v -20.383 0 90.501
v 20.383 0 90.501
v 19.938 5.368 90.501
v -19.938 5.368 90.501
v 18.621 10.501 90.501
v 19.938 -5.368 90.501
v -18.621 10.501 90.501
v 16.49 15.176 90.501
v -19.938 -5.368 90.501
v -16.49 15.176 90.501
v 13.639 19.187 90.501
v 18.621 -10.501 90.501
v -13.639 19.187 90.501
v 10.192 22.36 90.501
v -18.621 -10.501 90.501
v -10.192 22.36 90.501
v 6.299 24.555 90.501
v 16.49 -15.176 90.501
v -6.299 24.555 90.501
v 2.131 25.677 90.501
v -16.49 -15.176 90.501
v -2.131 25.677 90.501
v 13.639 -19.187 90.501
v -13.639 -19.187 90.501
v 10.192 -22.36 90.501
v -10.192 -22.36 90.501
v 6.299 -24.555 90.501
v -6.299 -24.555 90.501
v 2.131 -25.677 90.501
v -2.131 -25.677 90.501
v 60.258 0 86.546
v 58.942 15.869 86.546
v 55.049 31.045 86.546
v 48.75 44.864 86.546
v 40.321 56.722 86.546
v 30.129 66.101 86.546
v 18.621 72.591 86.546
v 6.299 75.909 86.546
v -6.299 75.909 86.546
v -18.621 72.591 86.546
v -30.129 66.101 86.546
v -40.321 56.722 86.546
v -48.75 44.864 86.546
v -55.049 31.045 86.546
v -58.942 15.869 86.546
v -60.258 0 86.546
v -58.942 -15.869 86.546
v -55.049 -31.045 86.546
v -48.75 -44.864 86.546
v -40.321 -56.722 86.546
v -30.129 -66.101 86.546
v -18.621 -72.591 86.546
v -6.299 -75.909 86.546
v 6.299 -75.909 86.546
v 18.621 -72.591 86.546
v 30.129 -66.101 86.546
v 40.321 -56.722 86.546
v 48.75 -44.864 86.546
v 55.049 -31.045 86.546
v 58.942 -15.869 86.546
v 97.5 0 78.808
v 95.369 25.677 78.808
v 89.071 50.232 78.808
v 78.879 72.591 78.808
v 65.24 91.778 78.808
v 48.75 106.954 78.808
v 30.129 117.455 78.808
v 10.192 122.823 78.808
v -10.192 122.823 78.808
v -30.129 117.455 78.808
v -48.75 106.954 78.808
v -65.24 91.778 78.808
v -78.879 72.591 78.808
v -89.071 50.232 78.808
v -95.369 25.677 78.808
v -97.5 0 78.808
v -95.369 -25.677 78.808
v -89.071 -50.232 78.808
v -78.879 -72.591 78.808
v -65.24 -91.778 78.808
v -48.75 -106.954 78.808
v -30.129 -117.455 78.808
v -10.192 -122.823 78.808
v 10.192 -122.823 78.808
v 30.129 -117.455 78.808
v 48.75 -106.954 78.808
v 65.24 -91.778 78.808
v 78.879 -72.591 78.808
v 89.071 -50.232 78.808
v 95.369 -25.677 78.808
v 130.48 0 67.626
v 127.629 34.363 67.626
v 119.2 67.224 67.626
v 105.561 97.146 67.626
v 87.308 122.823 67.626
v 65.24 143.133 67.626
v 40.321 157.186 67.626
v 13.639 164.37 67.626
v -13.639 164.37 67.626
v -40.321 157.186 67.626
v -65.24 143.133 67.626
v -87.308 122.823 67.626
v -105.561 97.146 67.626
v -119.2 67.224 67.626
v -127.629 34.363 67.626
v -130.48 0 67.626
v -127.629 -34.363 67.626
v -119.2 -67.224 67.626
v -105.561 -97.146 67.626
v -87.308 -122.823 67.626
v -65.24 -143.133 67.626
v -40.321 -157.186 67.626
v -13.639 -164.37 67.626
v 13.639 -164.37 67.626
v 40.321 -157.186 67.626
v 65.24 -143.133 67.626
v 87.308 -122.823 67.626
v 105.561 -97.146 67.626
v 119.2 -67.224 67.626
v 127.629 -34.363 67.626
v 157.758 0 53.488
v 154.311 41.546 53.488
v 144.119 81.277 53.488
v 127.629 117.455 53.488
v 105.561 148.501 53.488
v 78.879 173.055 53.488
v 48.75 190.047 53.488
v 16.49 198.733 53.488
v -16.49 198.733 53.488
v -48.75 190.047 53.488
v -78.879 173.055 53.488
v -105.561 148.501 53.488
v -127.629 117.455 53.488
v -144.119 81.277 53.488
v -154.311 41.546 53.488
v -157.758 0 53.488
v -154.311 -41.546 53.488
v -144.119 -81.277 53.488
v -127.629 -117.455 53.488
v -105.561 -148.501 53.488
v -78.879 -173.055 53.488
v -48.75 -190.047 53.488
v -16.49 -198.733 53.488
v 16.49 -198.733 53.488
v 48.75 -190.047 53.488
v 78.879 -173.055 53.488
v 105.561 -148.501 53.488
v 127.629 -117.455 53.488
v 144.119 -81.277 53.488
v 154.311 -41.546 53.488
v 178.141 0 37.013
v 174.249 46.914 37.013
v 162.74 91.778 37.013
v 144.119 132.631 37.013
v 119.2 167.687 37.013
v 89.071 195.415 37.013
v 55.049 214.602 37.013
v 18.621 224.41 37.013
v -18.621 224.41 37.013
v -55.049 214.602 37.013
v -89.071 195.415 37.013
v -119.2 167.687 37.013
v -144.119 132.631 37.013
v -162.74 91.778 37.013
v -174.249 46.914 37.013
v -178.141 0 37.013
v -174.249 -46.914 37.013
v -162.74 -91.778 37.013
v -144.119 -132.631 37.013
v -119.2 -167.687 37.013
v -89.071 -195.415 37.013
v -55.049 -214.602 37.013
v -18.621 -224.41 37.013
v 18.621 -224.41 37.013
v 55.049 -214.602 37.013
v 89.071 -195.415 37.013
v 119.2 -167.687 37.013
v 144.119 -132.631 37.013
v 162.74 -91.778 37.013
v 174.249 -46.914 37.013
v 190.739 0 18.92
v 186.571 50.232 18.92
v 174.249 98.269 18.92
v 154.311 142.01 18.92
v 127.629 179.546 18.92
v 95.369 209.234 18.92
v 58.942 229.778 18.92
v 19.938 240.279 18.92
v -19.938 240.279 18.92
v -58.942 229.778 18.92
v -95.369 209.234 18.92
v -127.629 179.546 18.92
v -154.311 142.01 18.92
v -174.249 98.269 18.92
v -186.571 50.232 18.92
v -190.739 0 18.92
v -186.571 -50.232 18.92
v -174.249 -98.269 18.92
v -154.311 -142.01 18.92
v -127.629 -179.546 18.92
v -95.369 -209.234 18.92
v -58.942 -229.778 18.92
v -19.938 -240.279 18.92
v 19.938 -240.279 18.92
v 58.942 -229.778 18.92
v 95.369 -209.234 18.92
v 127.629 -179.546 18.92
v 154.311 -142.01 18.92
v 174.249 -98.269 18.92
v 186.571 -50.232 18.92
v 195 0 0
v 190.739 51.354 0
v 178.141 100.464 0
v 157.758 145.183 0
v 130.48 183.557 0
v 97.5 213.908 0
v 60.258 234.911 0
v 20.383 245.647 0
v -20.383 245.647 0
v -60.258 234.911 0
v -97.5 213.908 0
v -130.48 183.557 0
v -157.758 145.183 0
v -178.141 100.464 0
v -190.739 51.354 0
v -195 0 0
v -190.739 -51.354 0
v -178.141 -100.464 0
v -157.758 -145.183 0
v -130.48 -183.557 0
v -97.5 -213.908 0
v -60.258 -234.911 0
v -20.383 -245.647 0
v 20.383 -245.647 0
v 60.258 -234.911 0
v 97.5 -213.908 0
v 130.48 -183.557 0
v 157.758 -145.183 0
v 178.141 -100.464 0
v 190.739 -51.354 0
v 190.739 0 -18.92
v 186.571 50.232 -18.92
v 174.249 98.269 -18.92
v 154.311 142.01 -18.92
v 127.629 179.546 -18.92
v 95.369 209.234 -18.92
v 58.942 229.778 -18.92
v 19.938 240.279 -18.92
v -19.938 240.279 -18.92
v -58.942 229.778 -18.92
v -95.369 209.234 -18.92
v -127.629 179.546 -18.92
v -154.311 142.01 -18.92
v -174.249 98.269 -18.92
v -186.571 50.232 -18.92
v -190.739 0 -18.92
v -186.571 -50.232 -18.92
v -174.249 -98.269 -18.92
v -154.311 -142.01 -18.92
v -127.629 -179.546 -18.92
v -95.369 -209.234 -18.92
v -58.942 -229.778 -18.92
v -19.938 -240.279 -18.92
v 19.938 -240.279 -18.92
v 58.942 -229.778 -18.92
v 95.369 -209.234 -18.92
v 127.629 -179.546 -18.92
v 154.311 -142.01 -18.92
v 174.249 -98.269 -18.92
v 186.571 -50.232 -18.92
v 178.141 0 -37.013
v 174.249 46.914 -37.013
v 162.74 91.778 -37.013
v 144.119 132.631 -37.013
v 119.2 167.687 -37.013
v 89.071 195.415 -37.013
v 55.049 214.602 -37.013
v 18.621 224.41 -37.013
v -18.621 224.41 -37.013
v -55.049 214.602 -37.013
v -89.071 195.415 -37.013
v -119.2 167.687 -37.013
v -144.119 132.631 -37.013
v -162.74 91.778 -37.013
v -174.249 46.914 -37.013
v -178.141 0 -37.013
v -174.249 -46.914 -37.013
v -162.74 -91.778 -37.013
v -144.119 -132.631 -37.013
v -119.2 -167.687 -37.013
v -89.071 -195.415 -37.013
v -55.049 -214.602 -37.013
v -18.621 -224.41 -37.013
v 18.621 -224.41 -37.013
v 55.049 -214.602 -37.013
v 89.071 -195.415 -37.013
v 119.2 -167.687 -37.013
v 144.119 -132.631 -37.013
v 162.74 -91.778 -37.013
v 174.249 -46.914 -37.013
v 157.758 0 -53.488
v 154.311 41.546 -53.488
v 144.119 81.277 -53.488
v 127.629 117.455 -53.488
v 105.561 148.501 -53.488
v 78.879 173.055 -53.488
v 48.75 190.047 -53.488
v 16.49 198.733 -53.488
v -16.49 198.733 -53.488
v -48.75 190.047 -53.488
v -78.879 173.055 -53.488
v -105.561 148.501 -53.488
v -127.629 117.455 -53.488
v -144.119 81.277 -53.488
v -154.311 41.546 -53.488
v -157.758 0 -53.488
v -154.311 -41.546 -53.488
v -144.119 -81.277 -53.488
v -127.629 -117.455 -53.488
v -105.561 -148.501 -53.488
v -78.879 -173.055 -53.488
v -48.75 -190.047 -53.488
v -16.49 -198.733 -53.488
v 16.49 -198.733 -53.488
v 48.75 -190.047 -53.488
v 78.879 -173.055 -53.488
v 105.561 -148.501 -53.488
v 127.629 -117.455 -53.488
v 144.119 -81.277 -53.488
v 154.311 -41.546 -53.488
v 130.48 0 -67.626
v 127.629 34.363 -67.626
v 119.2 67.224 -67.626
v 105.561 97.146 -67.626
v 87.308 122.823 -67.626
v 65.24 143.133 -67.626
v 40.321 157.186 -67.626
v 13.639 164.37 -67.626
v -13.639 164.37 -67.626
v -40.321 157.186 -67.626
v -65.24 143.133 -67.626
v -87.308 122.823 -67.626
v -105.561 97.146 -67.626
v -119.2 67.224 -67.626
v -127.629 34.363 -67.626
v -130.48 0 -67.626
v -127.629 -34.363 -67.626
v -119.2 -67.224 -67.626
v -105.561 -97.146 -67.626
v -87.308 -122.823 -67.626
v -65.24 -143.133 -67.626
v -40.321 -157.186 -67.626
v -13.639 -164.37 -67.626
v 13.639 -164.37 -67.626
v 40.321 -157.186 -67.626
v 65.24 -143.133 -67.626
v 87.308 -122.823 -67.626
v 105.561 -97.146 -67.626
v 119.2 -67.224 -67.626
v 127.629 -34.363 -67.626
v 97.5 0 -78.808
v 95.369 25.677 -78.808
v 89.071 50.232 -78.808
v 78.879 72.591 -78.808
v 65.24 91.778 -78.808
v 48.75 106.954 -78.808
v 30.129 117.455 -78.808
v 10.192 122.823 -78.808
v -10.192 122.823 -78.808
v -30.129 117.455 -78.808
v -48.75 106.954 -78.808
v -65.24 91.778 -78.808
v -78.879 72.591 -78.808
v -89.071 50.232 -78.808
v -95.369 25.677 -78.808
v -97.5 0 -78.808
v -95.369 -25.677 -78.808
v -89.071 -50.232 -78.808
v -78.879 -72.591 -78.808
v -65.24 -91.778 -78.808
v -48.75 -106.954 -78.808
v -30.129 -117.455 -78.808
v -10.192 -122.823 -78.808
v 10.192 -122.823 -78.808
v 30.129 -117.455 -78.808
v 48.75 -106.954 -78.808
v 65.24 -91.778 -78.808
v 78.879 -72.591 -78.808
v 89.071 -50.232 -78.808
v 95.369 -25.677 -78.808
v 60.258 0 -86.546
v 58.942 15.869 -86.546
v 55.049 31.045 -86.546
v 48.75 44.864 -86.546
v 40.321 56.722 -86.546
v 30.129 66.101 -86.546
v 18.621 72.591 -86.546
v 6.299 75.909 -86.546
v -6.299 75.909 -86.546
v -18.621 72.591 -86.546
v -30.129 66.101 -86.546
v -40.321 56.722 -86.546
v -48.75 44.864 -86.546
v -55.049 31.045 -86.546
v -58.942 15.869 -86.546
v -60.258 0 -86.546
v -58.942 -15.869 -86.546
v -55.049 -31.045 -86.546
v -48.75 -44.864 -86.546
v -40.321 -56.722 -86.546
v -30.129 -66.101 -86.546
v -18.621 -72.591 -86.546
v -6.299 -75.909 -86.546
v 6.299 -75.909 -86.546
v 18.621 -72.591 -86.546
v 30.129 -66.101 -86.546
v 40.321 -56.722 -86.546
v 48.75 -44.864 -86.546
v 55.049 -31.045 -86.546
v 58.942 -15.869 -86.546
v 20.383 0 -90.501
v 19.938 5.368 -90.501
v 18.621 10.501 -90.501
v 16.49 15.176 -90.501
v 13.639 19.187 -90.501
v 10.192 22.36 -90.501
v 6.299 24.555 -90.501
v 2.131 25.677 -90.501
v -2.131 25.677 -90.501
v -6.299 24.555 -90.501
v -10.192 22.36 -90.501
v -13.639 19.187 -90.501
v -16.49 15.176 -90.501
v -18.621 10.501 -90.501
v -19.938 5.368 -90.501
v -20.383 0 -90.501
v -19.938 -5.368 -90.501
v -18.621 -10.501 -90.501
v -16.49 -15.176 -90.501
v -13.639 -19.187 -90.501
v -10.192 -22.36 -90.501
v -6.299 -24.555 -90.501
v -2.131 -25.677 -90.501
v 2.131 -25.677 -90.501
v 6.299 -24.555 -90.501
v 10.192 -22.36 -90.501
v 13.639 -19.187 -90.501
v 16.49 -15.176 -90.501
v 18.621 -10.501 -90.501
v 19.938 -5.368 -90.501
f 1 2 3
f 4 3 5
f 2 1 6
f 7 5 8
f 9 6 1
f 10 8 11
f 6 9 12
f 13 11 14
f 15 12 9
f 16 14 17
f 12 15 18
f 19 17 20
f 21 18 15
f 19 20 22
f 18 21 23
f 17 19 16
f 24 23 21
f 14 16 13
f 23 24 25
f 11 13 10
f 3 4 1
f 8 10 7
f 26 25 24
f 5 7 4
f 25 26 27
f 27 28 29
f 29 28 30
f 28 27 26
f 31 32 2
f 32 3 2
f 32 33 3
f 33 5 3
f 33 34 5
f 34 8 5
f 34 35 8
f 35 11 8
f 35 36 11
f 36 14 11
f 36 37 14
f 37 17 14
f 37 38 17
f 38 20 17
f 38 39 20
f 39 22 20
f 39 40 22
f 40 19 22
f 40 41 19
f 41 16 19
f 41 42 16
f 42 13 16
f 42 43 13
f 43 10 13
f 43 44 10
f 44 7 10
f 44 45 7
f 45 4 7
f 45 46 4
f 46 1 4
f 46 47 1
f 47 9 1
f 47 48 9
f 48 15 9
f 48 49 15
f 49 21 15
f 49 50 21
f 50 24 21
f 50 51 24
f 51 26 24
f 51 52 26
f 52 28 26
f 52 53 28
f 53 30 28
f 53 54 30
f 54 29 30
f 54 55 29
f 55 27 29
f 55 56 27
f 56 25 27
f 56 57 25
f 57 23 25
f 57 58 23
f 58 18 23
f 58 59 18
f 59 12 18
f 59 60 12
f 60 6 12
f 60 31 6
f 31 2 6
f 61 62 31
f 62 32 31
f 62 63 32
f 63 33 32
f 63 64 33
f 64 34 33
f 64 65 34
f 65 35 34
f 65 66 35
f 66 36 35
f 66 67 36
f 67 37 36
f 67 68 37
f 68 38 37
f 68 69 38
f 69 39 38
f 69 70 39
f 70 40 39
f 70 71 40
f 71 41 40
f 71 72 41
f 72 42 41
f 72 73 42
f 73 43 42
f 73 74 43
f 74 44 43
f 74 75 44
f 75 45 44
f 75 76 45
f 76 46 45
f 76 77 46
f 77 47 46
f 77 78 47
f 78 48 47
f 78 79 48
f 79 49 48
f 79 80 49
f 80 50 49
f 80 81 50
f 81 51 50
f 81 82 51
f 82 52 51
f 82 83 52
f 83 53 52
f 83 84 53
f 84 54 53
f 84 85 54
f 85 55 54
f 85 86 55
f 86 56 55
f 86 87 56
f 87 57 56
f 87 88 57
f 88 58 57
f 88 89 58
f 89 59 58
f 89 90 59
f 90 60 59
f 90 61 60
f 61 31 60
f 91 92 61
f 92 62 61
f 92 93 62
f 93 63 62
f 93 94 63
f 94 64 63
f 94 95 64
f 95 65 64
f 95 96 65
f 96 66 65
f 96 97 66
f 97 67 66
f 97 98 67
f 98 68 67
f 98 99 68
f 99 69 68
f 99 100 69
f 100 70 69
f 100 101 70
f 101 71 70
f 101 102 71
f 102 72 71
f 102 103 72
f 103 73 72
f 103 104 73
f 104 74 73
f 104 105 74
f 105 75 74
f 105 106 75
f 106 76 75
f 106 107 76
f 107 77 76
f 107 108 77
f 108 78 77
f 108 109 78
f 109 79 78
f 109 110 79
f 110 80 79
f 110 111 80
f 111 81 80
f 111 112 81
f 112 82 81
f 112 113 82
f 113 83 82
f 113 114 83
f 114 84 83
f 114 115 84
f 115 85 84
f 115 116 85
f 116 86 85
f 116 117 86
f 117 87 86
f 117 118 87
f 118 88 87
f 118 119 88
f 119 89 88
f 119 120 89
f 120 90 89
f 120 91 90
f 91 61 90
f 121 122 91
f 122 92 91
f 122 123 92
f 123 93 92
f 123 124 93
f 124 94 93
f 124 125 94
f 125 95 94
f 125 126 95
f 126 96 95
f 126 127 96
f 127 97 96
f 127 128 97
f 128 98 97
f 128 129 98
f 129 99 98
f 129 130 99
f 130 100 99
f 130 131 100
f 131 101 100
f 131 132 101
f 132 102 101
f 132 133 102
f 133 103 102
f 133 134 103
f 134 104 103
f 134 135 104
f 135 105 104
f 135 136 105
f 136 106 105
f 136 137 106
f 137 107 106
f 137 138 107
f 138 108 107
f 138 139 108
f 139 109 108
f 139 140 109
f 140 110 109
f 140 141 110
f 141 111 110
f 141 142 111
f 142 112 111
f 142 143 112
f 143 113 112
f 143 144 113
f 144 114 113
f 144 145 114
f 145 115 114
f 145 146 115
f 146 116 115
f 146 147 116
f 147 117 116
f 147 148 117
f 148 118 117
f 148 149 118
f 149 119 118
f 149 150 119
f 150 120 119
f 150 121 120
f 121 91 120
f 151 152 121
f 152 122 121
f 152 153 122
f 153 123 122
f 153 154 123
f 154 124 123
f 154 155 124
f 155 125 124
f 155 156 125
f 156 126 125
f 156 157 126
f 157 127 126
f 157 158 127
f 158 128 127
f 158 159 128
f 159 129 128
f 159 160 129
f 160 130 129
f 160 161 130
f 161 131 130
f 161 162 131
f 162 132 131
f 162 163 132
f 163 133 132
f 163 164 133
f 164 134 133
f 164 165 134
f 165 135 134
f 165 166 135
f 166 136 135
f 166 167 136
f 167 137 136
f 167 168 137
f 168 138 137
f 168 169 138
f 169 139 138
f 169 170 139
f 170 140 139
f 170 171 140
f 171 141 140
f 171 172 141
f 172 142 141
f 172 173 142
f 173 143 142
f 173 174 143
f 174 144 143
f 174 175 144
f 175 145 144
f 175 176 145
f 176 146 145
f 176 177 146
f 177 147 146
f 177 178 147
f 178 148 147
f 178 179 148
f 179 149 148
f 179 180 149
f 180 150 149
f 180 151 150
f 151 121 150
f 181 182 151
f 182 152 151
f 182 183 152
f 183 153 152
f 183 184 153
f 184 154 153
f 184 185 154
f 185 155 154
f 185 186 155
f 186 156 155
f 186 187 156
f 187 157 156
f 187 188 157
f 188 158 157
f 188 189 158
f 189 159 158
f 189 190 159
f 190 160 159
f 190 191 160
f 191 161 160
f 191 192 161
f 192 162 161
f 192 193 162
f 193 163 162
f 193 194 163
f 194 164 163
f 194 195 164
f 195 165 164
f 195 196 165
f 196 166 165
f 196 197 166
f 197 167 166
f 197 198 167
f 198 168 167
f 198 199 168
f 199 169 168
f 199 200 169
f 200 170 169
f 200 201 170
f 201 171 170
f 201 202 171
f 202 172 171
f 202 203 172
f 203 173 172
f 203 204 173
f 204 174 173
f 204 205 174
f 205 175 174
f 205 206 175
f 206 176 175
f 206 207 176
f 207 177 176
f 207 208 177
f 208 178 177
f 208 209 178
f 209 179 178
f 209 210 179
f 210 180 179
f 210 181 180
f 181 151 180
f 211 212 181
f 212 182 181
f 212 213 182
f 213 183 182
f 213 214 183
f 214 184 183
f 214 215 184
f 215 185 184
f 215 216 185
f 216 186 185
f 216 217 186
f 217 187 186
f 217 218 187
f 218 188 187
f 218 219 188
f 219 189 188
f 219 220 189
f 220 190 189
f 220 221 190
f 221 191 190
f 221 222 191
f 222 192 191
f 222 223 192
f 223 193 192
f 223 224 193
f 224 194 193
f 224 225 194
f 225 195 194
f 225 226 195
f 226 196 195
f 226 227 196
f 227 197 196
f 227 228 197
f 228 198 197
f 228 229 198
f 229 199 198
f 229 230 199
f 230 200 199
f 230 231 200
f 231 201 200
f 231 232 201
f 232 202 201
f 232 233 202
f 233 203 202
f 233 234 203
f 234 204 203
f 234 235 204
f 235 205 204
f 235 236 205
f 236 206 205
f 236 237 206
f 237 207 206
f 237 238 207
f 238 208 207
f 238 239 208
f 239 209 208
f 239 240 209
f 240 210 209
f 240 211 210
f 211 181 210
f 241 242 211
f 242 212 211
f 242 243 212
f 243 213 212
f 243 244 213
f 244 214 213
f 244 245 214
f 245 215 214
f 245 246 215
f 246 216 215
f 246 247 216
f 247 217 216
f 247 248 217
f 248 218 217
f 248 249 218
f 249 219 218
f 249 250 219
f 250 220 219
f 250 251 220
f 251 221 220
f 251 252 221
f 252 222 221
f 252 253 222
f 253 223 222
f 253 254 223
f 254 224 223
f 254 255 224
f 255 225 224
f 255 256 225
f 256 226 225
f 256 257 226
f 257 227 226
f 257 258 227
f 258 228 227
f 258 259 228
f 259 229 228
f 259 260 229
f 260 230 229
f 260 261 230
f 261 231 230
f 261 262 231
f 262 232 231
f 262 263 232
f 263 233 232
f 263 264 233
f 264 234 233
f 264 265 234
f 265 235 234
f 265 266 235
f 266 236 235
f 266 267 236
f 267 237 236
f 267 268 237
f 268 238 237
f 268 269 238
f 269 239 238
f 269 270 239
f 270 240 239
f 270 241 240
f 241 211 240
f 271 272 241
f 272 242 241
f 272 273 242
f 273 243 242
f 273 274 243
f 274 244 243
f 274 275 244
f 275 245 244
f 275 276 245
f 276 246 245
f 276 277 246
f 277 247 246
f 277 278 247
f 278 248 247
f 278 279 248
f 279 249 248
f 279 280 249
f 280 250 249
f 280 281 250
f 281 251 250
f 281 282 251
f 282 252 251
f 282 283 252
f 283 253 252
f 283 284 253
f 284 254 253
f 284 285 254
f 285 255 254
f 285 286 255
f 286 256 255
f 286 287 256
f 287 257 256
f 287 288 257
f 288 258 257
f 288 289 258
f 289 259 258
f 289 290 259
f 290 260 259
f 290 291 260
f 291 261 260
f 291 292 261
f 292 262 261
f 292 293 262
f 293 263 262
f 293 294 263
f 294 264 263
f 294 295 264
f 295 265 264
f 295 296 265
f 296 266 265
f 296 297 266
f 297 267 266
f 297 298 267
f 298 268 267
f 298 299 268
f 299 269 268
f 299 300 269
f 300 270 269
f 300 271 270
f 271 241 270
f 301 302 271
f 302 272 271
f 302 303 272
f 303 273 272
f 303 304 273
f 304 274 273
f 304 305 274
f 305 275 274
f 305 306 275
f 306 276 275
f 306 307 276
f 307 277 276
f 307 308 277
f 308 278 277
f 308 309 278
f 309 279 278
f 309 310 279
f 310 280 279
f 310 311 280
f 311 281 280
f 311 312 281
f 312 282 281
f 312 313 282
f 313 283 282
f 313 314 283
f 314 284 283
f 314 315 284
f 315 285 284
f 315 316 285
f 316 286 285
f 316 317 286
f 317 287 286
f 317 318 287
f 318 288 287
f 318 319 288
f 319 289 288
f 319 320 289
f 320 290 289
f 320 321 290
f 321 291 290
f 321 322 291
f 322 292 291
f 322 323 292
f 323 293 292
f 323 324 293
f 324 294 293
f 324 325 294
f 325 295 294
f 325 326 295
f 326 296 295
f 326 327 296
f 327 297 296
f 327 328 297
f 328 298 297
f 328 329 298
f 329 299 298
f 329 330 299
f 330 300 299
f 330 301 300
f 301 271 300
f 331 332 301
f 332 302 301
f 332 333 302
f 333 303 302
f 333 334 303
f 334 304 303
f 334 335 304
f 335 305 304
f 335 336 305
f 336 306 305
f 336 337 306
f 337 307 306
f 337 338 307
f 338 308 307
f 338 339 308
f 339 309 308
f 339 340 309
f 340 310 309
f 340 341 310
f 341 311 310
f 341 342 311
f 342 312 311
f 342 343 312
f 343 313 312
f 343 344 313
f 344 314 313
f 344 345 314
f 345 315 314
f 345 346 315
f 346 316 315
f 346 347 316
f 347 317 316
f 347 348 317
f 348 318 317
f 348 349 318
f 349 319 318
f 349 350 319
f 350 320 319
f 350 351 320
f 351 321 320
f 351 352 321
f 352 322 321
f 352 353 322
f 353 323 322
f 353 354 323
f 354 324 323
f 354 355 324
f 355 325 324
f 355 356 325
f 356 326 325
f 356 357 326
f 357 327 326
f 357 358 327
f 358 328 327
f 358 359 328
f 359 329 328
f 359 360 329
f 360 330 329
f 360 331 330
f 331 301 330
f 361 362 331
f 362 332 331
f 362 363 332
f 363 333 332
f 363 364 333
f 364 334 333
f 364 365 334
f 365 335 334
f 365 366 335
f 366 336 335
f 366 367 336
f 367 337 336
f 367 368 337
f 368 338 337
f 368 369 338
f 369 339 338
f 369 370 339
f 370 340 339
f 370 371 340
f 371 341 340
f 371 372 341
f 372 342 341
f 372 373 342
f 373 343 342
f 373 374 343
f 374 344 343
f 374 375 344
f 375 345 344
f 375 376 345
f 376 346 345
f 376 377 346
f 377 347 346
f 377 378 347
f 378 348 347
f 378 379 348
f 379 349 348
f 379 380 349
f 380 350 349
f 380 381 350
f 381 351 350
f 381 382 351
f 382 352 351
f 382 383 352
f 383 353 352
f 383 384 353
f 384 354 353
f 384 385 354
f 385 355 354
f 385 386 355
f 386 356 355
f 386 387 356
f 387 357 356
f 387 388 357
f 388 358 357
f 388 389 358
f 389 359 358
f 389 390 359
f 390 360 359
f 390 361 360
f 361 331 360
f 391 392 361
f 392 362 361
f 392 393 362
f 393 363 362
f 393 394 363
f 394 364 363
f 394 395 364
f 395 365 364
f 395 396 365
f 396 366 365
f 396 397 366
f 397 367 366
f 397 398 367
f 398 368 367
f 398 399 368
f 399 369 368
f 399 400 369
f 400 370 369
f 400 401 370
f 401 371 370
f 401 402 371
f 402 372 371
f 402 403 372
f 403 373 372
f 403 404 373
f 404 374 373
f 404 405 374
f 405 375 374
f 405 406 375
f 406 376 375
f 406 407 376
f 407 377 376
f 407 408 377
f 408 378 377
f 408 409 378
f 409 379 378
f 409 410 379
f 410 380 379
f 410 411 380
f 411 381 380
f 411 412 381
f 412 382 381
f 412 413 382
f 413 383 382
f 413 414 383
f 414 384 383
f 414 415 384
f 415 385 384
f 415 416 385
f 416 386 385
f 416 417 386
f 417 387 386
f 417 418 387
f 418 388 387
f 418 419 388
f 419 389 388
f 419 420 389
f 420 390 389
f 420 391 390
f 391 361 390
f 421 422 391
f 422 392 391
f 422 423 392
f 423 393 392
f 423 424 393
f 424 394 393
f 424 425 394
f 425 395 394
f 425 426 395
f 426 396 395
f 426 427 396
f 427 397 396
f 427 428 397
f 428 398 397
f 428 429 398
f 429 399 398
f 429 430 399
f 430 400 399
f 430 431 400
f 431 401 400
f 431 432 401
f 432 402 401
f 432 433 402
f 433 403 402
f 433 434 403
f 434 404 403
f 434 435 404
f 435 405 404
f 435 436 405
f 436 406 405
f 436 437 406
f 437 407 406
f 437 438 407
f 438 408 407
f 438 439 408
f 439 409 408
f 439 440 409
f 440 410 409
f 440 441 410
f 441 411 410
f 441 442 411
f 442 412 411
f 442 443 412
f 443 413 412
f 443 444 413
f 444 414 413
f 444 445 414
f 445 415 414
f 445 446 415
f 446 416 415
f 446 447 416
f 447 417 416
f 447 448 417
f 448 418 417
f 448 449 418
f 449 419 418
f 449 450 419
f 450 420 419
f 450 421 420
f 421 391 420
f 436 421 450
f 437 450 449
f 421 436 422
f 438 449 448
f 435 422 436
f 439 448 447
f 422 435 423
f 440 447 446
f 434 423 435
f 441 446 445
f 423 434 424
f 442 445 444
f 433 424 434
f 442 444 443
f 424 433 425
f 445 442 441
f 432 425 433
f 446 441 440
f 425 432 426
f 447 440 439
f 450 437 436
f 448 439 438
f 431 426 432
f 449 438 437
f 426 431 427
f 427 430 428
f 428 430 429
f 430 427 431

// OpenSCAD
// Generated by SolidPython 1.0.1 on 2020-07-29 00:46:52


scale(v = [15, 19, 7]) {
	sphere(r = 13);
}
/***********************************************
*********      SolidPython code:      **********
************************************************
 
# import packages: SolidPython
from solid import *
from solid.utils import *
from itertools import chain, combinations, permutations


class Resize:

    def __init__(self, scad_file):
        self.scad_file = scad_file
        #self.scad_file = import_scad(scad_file)
        # cone/cylinder param:
        self.r1 = 0
        self.r2 = 0
        self.h = 0
        # rectangular prism param:
        self.w = 0
        self.l = 0
        # ellipse param:
        self.r = 0

    # import OpenScad code (file name corresponds to shape)


    # classify shape + parameters
    def assign(self, param1, param2, param3):
        if self.scad_file == 'cone.scad':
            self.r1 = param1
            self.r2 = param2
            self.h = param3
        elif self.scad_file == 'cylinder.scad':
            self.r1 = param1
            self.r2 = param2
            self.h = param3
        elif self.scad_file == 'rectangularPrism.scad':
            self.h = param1
            self.l = param2
            self.w = param3
        else:
            self.r = param1
            self.h = param2

    # resize parameters
    def iterate(self):
        x = range(3, 20, 2)
        i = 1
        if self.scad_file == 'cone.scad':
            tempList = list(permutations(x, 2))
            for temp in tempList:
                param1 = temp[0]
                param2 = temp[1]
                filepath = 'produced_scad_files/' + 'cone' + str(param1) + '_' + str(param2) + '_' + '.scad'
                scad_render_to_file(cylinder(h=param1, r1=param2, r2=0), filepath)

        elif self.scad_file == 'cylinder.scad':
            tempList = list(permutations(x, 3))
            for temp in tempList:
                param1 = temp[0]
                param2 = temp[1]
                filepath = 'produced_scad_files/' + 'cylinder' + str(param1) + '_' + str(param2) + '_' + '.scad'
                scad_render_to_file(cylinder(h=param1, r1=param2, r2=param2), filepath)

        elif self.scad_file == 'rectangularPrism.scad':
            tempList = list(permutations(x, 3))
            for temp in tempList:
                param1 = temp[0]
                param2 = temp[1]
                param3 = temp[2]
                filepath = 'produced_scad_files/' + 'rectangularPrism' + str(param1) + '_' + str(param2) + '_' + str(
                    param3) + '.scad'
                scad_render_to_file(cube(size=(param1, param2, param3)), filepath)

        elif self.scad_file == 'ellipse.scad':
            tempList = list(permutations(x, 4))
            for temp in tempList:
                param1 = temp[0]
                param2 = temp[1]
                param3 = temp[2]
                param4 = temp[3]
                filepath = 'produced_scad_files/' + 'ellipse' + str(param1) + '_' + str(param2) + '_' + str(param3) + '_' + str(param4) + '.scad'
                scad_render_to_file(scale([param1, param2, param3])(sphere(r=param4)), filepath)

    def render_to_scadfile(self):
        scad_render_to_file(scad, 'example.scad') 
 
************************************************/
